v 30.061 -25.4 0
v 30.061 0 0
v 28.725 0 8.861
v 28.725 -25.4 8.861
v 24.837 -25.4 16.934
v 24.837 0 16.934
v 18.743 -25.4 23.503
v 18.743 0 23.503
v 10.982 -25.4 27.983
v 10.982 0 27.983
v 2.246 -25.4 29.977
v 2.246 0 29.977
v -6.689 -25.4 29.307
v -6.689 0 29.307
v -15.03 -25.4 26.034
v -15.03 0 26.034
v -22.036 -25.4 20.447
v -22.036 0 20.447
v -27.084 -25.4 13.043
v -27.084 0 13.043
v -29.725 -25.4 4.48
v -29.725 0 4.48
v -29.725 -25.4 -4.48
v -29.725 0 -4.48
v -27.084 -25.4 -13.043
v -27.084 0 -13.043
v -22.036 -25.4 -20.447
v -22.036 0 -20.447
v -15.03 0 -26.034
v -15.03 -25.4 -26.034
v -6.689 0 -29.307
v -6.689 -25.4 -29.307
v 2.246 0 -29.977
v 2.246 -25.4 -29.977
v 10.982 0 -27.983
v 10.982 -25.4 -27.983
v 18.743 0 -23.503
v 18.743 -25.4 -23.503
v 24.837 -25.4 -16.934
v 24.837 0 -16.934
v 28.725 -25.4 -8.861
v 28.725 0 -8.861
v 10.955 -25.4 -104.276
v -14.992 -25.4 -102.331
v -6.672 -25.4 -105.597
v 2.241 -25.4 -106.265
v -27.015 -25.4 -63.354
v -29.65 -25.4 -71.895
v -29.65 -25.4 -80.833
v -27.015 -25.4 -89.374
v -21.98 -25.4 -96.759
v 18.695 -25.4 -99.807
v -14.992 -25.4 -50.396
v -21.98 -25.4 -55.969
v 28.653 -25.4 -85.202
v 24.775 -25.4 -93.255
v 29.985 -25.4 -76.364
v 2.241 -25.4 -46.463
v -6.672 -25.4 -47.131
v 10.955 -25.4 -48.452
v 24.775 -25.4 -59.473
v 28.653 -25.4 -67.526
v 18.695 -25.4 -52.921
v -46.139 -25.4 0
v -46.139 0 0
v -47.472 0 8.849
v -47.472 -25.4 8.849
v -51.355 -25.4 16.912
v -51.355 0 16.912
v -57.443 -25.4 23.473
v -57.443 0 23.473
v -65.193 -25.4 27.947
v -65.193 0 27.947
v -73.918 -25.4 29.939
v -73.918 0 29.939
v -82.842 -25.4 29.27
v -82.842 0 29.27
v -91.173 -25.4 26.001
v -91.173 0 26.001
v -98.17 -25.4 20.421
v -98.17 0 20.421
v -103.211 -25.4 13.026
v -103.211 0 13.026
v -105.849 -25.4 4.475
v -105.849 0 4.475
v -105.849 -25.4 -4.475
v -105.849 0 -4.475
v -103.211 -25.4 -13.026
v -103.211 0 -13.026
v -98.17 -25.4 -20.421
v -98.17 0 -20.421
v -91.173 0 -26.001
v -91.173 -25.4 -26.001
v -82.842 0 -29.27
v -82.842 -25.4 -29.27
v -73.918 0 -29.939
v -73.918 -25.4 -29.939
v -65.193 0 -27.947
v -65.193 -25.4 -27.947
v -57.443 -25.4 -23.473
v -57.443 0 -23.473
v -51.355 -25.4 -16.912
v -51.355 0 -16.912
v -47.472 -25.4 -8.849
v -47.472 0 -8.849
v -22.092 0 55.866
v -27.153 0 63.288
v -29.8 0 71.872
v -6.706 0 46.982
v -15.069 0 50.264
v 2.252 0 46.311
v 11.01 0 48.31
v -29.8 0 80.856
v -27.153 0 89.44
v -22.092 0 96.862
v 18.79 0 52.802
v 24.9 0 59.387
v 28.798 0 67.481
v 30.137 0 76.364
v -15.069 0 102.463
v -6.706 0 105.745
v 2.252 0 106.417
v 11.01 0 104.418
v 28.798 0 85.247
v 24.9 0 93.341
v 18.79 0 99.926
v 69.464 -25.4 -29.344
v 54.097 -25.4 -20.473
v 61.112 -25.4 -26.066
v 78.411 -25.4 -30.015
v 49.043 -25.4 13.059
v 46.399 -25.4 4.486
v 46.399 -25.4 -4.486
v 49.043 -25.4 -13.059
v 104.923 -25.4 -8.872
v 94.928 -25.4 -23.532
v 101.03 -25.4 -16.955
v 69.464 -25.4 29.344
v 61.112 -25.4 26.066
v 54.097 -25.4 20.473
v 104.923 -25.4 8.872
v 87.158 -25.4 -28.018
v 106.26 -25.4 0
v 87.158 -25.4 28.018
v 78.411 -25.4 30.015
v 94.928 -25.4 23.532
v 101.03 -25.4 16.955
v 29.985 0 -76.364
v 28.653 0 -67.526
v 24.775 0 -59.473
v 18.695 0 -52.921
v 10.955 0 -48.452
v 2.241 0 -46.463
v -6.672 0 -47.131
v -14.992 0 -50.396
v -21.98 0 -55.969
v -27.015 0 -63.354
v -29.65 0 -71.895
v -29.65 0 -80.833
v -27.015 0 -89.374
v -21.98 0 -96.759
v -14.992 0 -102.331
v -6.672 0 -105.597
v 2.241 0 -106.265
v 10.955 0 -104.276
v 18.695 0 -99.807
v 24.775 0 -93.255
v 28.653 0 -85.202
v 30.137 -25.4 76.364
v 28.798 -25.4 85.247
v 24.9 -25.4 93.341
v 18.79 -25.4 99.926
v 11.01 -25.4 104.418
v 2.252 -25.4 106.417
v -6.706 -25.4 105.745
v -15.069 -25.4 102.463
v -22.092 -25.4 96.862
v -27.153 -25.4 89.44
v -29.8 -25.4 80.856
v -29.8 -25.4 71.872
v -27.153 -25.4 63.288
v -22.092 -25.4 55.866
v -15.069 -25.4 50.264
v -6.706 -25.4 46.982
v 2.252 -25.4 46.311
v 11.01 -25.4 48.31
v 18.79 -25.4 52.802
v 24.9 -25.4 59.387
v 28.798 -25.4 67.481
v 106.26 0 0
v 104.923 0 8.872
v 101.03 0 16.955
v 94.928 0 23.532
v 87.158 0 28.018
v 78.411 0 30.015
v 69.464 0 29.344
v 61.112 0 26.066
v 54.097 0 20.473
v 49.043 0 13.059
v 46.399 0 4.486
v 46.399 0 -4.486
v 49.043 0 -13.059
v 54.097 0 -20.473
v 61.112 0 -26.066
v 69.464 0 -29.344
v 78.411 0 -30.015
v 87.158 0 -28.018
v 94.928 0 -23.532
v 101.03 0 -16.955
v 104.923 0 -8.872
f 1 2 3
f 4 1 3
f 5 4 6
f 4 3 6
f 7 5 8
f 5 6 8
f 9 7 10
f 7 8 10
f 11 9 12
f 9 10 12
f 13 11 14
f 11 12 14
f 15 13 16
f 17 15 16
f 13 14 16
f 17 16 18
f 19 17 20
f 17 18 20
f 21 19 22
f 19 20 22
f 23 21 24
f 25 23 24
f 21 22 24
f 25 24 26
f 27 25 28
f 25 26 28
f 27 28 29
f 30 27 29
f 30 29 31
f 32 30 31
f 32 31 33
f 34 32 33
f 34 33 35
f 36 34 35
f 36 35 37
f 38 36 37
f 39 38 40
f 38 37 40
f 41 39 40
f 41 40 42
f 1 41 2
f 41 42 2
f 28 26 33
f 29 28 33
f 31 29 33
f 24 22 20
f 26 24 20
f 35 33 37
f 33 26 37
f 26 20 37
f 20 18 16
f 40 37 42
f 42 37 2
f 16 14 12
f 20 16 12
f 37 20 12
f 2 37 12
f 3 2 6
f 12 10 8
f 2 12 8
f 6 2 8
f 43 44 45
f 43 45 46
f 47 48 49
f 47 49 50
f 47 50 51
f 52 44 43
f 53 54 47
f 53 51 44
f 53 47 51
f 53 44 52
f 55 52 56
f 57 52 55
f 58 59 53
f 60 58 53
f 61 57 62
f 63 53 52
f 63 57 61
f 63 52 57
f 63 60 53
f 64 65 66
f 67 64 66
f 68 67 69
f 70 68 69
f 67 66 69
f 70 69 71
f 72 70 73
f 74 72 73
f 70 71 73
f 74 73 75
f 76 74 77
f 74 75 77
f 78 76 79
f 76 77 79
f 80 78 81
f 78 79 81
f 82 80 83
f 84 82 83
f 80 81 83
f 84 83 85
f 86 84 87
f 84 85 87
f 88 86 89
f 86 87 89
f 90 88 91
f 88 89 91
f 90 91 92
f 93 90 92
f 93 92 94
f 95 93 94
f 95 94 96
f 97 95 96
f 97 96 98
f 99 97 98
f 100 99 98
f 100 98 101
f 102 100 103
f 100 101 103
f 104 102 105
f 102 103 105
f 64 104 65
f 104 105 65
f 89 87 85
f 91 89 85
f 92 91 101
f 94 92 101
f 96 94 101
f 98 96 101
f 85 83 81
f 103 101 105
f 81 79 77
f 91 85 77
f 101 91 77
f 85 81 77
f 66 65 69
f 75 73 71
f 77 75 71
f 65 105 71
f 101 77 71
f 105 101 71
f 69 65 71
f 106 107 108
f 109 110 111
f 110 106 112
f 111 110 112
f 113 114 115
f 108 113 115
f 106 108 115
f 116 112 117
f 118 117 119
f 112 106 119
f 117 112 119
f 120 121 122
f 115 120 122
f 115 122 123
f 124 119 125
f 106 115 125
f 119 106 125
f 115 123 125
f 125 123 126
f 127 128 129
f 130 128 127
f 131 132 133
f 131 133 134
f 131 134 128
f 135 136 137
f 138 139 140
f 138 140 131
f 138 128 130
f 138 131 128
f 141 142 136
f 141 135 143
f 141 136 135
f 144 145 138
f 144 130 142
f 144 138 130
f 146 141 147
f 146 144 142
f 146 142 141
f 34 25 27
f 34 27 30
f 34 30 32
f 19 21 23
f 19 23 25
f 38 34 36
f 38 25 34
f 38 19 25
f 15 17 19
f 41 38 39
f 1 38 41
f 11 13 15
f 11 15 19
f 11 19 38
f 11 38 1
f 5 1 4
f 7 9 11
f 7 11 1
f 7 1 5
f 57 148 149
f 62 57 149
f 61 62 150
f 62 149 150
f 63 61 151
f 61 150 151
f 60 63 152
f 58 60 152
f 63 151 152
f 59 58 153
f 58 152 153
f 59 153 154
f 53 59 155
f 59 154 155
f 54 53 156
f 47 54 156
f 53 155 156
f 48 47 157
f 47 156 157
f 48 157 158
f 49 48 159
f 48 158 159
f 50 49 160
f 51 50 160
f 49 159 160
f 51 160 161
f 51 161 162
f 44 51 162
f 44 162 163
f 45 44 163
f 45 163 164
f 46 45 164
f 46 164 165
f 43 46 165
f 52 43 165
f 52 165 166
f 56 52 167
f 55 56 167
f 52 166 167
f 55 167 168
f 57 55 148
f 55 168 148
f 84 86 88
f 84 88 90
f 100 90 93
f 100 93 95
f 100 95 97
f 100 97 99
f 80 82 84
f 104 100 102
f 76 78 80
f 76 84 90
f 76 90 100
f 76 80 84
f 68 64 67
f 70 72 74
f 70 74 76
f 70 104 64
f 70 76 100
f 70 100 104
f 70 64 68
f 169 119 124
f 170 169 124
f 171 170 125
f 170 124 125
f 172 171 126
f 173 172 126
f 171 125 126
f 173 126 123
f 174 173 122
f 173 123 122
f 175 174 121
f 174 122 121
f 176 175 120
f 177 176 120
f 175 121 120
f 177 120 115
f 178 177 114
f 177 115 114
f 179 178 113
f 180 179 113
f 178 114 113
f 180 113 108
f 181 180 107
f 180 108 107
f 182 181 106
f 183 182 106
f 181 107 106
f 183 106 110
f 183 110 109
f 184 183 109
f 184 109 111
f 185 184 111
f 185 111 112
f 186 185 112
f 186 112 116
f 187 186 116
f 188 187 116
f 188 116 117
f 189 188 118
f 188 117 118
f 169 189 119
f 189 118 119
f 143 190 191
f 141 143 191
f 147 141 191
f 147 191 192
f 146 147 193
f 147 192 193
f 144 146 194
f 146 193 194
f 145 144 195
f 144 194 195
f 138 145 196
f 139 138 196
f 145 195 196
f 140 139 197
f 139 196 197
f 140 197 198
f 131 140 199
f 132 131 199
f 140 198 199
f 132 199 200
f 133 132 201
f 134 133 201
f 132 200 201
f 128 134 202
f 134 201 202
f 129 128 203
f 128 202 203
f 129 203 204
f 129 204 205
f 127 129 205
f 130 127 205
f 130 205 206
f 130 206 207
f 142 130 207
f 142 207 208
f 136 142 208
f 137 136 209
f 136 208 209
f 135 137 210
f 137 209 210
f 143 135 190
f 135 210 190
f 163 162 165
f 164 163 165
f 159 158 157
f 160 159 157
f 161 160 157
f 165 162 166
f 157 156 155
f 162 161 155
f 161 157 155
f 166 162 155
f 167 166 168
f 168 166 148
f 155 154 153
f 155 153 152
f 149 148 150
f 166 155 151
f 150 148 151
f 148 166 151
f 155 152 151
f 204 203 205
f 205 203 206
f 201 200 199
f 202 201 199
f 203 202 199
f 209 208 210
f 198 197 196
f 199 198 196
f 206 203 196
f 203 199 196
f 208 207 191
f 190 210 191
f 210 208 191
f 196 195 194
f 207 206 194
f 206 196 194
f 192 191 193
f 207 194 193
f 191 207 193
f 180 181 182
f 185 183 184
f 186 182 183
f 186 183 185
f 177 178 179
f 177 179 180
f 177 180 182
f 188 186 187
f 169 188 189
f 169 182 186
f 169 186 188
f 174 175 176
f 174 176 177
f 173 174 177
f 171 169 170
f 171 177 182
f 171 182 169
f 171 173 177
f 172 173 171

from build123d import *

# Parameters (mm, degrees)
F0_R     = 30.0228
F0_R_2   = 30.0609
F0_R_3   = 30.1371
F0_R_4   = 30.099
F0_R_5   = 29.9847
F1_DEPTH = 25.4


with BuildPart() as f1:
    # F0 (on Front) → F1 (new body)
    with BuildSketch(Plane.XZ):
        with Locations((-76.161414, 0)):
            Circle(F0_R)
        Circle(F0_R_2)
        with Locations((0, 76.363981)):
            Circle(F0_R_3)
        with Locations((76.161422, 0)):
            Circle(F0_R_4)
        with Locations((0, -76.363981)):
            Circle(F0_R_5)
    extrude(amount=F1_DEPTH)


solid = f1.part
